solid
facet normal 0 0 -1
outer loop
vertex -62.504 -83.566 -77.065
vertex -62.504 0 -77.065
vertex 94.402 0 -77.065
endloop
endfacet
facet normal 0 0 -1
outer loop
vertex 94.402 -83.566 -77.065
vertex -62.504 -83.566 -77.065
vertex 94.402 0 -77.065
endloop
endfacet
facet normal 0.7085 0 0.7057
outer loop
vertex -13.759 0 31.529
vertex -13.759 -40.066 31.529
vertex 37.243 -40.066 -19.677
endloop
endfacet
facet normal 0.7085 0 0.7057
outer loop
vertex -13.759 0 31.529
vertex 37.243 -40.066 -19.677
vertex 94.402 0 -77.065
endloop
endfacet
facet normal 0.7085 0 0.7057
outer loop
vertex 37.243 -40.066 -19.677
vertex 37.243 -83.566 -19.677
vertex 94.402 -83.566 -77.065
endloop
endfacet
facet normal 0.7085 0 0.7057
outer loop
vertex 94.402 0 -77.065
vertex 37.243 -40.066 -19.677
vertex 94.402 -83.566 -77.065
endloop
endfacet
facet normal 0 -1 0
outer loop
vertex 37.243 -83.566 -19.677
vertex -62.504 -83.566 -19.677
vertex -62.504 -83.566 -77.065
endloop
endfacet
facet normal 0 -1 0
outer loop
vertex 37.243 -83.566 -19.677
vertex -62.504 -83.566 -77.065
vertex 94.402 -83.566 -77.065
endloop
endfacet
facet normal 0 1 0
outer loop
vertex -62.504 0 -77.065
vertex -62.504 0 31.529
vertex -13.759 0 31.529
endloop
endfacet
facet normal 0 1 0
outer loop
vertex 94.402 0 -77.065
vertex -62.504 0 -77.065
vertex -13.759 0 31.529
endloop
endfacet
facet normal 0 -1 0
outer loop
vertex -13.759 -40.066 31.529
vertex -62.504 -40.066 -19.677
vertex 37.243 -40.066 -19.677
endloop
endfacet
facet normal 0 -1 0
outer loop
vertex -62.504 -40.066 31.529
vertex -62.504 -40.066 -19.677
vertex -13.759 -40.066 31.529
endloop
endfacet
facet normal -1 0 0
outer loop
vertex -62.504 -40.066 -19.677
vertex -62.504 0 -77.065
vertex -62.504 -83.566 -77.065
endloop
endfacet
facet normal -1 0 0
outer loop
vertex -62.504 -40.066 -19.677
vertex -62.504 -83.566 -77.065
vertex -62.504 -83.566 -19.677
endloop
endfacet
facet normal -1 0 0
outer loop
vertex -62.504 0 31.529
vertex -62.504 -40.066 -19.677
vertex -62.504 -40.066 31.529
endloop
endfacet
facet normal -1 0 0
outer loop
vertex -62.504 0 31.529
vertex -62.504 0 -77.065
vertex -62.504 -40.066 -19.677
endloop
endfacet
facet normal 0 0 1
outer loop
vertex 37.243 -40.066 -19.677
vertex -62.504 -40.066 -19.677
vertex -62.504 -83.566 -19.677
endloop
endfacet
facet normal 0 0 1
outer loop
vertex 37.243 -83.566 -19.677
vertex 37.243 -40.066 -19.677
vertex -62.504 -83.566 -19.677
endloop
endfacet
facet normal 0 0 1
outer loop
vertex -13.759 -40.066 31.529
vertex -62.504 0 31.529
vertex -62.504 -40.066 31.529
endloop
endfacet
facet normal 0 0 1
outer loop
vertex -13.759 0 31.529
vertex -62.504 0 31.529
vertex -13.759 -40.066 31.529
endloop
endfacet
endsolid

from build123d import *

# Parameters (mm, degrees)
F0_W     = 156.905822
F0_H     = 108.593594
F1_DEPTH = 83.566
F3_DEPTH = 83.567
F4_W     = 43.500216
F4_H     = 51.205804
F5_DEPTH = 156.906822


with BuildPart() as f1:
    # F0 (on Front) → F1 (new body)
    with BuildSketch(Plane.XZ):
        with Locations((15.949223, -22.768164)):
            Rectangle(F0_W, F0_H)
    extrude(amount=F1_DEPTH)

    # F2 (on face) → F3 (cut, through all)
    with BuildSketch(Plane.XZ.offset(83.566)):
        Polygon((94.402134, 31.528633), (-13.758647, 31.528633), (94.402134, -77.064961), align=None)
    extrude(amount=-F3_DEPTH, mode=Mode.SUBTRACT)

    # F4 (on face) → F5 (cut, through all)
    with BuildSketch(Plane(origin=(-62.503688, 0, 0), x_dir=(0, -1, 0), z_dir=(-1, 0, 0))):
        with Locations((61.815892, 5.925731)):
            Rectangle(F4_W, F4_H)
    extrude(amount=-F5_DEPTH, mode=Mode.SUBTRACT)


solid = f1.part
